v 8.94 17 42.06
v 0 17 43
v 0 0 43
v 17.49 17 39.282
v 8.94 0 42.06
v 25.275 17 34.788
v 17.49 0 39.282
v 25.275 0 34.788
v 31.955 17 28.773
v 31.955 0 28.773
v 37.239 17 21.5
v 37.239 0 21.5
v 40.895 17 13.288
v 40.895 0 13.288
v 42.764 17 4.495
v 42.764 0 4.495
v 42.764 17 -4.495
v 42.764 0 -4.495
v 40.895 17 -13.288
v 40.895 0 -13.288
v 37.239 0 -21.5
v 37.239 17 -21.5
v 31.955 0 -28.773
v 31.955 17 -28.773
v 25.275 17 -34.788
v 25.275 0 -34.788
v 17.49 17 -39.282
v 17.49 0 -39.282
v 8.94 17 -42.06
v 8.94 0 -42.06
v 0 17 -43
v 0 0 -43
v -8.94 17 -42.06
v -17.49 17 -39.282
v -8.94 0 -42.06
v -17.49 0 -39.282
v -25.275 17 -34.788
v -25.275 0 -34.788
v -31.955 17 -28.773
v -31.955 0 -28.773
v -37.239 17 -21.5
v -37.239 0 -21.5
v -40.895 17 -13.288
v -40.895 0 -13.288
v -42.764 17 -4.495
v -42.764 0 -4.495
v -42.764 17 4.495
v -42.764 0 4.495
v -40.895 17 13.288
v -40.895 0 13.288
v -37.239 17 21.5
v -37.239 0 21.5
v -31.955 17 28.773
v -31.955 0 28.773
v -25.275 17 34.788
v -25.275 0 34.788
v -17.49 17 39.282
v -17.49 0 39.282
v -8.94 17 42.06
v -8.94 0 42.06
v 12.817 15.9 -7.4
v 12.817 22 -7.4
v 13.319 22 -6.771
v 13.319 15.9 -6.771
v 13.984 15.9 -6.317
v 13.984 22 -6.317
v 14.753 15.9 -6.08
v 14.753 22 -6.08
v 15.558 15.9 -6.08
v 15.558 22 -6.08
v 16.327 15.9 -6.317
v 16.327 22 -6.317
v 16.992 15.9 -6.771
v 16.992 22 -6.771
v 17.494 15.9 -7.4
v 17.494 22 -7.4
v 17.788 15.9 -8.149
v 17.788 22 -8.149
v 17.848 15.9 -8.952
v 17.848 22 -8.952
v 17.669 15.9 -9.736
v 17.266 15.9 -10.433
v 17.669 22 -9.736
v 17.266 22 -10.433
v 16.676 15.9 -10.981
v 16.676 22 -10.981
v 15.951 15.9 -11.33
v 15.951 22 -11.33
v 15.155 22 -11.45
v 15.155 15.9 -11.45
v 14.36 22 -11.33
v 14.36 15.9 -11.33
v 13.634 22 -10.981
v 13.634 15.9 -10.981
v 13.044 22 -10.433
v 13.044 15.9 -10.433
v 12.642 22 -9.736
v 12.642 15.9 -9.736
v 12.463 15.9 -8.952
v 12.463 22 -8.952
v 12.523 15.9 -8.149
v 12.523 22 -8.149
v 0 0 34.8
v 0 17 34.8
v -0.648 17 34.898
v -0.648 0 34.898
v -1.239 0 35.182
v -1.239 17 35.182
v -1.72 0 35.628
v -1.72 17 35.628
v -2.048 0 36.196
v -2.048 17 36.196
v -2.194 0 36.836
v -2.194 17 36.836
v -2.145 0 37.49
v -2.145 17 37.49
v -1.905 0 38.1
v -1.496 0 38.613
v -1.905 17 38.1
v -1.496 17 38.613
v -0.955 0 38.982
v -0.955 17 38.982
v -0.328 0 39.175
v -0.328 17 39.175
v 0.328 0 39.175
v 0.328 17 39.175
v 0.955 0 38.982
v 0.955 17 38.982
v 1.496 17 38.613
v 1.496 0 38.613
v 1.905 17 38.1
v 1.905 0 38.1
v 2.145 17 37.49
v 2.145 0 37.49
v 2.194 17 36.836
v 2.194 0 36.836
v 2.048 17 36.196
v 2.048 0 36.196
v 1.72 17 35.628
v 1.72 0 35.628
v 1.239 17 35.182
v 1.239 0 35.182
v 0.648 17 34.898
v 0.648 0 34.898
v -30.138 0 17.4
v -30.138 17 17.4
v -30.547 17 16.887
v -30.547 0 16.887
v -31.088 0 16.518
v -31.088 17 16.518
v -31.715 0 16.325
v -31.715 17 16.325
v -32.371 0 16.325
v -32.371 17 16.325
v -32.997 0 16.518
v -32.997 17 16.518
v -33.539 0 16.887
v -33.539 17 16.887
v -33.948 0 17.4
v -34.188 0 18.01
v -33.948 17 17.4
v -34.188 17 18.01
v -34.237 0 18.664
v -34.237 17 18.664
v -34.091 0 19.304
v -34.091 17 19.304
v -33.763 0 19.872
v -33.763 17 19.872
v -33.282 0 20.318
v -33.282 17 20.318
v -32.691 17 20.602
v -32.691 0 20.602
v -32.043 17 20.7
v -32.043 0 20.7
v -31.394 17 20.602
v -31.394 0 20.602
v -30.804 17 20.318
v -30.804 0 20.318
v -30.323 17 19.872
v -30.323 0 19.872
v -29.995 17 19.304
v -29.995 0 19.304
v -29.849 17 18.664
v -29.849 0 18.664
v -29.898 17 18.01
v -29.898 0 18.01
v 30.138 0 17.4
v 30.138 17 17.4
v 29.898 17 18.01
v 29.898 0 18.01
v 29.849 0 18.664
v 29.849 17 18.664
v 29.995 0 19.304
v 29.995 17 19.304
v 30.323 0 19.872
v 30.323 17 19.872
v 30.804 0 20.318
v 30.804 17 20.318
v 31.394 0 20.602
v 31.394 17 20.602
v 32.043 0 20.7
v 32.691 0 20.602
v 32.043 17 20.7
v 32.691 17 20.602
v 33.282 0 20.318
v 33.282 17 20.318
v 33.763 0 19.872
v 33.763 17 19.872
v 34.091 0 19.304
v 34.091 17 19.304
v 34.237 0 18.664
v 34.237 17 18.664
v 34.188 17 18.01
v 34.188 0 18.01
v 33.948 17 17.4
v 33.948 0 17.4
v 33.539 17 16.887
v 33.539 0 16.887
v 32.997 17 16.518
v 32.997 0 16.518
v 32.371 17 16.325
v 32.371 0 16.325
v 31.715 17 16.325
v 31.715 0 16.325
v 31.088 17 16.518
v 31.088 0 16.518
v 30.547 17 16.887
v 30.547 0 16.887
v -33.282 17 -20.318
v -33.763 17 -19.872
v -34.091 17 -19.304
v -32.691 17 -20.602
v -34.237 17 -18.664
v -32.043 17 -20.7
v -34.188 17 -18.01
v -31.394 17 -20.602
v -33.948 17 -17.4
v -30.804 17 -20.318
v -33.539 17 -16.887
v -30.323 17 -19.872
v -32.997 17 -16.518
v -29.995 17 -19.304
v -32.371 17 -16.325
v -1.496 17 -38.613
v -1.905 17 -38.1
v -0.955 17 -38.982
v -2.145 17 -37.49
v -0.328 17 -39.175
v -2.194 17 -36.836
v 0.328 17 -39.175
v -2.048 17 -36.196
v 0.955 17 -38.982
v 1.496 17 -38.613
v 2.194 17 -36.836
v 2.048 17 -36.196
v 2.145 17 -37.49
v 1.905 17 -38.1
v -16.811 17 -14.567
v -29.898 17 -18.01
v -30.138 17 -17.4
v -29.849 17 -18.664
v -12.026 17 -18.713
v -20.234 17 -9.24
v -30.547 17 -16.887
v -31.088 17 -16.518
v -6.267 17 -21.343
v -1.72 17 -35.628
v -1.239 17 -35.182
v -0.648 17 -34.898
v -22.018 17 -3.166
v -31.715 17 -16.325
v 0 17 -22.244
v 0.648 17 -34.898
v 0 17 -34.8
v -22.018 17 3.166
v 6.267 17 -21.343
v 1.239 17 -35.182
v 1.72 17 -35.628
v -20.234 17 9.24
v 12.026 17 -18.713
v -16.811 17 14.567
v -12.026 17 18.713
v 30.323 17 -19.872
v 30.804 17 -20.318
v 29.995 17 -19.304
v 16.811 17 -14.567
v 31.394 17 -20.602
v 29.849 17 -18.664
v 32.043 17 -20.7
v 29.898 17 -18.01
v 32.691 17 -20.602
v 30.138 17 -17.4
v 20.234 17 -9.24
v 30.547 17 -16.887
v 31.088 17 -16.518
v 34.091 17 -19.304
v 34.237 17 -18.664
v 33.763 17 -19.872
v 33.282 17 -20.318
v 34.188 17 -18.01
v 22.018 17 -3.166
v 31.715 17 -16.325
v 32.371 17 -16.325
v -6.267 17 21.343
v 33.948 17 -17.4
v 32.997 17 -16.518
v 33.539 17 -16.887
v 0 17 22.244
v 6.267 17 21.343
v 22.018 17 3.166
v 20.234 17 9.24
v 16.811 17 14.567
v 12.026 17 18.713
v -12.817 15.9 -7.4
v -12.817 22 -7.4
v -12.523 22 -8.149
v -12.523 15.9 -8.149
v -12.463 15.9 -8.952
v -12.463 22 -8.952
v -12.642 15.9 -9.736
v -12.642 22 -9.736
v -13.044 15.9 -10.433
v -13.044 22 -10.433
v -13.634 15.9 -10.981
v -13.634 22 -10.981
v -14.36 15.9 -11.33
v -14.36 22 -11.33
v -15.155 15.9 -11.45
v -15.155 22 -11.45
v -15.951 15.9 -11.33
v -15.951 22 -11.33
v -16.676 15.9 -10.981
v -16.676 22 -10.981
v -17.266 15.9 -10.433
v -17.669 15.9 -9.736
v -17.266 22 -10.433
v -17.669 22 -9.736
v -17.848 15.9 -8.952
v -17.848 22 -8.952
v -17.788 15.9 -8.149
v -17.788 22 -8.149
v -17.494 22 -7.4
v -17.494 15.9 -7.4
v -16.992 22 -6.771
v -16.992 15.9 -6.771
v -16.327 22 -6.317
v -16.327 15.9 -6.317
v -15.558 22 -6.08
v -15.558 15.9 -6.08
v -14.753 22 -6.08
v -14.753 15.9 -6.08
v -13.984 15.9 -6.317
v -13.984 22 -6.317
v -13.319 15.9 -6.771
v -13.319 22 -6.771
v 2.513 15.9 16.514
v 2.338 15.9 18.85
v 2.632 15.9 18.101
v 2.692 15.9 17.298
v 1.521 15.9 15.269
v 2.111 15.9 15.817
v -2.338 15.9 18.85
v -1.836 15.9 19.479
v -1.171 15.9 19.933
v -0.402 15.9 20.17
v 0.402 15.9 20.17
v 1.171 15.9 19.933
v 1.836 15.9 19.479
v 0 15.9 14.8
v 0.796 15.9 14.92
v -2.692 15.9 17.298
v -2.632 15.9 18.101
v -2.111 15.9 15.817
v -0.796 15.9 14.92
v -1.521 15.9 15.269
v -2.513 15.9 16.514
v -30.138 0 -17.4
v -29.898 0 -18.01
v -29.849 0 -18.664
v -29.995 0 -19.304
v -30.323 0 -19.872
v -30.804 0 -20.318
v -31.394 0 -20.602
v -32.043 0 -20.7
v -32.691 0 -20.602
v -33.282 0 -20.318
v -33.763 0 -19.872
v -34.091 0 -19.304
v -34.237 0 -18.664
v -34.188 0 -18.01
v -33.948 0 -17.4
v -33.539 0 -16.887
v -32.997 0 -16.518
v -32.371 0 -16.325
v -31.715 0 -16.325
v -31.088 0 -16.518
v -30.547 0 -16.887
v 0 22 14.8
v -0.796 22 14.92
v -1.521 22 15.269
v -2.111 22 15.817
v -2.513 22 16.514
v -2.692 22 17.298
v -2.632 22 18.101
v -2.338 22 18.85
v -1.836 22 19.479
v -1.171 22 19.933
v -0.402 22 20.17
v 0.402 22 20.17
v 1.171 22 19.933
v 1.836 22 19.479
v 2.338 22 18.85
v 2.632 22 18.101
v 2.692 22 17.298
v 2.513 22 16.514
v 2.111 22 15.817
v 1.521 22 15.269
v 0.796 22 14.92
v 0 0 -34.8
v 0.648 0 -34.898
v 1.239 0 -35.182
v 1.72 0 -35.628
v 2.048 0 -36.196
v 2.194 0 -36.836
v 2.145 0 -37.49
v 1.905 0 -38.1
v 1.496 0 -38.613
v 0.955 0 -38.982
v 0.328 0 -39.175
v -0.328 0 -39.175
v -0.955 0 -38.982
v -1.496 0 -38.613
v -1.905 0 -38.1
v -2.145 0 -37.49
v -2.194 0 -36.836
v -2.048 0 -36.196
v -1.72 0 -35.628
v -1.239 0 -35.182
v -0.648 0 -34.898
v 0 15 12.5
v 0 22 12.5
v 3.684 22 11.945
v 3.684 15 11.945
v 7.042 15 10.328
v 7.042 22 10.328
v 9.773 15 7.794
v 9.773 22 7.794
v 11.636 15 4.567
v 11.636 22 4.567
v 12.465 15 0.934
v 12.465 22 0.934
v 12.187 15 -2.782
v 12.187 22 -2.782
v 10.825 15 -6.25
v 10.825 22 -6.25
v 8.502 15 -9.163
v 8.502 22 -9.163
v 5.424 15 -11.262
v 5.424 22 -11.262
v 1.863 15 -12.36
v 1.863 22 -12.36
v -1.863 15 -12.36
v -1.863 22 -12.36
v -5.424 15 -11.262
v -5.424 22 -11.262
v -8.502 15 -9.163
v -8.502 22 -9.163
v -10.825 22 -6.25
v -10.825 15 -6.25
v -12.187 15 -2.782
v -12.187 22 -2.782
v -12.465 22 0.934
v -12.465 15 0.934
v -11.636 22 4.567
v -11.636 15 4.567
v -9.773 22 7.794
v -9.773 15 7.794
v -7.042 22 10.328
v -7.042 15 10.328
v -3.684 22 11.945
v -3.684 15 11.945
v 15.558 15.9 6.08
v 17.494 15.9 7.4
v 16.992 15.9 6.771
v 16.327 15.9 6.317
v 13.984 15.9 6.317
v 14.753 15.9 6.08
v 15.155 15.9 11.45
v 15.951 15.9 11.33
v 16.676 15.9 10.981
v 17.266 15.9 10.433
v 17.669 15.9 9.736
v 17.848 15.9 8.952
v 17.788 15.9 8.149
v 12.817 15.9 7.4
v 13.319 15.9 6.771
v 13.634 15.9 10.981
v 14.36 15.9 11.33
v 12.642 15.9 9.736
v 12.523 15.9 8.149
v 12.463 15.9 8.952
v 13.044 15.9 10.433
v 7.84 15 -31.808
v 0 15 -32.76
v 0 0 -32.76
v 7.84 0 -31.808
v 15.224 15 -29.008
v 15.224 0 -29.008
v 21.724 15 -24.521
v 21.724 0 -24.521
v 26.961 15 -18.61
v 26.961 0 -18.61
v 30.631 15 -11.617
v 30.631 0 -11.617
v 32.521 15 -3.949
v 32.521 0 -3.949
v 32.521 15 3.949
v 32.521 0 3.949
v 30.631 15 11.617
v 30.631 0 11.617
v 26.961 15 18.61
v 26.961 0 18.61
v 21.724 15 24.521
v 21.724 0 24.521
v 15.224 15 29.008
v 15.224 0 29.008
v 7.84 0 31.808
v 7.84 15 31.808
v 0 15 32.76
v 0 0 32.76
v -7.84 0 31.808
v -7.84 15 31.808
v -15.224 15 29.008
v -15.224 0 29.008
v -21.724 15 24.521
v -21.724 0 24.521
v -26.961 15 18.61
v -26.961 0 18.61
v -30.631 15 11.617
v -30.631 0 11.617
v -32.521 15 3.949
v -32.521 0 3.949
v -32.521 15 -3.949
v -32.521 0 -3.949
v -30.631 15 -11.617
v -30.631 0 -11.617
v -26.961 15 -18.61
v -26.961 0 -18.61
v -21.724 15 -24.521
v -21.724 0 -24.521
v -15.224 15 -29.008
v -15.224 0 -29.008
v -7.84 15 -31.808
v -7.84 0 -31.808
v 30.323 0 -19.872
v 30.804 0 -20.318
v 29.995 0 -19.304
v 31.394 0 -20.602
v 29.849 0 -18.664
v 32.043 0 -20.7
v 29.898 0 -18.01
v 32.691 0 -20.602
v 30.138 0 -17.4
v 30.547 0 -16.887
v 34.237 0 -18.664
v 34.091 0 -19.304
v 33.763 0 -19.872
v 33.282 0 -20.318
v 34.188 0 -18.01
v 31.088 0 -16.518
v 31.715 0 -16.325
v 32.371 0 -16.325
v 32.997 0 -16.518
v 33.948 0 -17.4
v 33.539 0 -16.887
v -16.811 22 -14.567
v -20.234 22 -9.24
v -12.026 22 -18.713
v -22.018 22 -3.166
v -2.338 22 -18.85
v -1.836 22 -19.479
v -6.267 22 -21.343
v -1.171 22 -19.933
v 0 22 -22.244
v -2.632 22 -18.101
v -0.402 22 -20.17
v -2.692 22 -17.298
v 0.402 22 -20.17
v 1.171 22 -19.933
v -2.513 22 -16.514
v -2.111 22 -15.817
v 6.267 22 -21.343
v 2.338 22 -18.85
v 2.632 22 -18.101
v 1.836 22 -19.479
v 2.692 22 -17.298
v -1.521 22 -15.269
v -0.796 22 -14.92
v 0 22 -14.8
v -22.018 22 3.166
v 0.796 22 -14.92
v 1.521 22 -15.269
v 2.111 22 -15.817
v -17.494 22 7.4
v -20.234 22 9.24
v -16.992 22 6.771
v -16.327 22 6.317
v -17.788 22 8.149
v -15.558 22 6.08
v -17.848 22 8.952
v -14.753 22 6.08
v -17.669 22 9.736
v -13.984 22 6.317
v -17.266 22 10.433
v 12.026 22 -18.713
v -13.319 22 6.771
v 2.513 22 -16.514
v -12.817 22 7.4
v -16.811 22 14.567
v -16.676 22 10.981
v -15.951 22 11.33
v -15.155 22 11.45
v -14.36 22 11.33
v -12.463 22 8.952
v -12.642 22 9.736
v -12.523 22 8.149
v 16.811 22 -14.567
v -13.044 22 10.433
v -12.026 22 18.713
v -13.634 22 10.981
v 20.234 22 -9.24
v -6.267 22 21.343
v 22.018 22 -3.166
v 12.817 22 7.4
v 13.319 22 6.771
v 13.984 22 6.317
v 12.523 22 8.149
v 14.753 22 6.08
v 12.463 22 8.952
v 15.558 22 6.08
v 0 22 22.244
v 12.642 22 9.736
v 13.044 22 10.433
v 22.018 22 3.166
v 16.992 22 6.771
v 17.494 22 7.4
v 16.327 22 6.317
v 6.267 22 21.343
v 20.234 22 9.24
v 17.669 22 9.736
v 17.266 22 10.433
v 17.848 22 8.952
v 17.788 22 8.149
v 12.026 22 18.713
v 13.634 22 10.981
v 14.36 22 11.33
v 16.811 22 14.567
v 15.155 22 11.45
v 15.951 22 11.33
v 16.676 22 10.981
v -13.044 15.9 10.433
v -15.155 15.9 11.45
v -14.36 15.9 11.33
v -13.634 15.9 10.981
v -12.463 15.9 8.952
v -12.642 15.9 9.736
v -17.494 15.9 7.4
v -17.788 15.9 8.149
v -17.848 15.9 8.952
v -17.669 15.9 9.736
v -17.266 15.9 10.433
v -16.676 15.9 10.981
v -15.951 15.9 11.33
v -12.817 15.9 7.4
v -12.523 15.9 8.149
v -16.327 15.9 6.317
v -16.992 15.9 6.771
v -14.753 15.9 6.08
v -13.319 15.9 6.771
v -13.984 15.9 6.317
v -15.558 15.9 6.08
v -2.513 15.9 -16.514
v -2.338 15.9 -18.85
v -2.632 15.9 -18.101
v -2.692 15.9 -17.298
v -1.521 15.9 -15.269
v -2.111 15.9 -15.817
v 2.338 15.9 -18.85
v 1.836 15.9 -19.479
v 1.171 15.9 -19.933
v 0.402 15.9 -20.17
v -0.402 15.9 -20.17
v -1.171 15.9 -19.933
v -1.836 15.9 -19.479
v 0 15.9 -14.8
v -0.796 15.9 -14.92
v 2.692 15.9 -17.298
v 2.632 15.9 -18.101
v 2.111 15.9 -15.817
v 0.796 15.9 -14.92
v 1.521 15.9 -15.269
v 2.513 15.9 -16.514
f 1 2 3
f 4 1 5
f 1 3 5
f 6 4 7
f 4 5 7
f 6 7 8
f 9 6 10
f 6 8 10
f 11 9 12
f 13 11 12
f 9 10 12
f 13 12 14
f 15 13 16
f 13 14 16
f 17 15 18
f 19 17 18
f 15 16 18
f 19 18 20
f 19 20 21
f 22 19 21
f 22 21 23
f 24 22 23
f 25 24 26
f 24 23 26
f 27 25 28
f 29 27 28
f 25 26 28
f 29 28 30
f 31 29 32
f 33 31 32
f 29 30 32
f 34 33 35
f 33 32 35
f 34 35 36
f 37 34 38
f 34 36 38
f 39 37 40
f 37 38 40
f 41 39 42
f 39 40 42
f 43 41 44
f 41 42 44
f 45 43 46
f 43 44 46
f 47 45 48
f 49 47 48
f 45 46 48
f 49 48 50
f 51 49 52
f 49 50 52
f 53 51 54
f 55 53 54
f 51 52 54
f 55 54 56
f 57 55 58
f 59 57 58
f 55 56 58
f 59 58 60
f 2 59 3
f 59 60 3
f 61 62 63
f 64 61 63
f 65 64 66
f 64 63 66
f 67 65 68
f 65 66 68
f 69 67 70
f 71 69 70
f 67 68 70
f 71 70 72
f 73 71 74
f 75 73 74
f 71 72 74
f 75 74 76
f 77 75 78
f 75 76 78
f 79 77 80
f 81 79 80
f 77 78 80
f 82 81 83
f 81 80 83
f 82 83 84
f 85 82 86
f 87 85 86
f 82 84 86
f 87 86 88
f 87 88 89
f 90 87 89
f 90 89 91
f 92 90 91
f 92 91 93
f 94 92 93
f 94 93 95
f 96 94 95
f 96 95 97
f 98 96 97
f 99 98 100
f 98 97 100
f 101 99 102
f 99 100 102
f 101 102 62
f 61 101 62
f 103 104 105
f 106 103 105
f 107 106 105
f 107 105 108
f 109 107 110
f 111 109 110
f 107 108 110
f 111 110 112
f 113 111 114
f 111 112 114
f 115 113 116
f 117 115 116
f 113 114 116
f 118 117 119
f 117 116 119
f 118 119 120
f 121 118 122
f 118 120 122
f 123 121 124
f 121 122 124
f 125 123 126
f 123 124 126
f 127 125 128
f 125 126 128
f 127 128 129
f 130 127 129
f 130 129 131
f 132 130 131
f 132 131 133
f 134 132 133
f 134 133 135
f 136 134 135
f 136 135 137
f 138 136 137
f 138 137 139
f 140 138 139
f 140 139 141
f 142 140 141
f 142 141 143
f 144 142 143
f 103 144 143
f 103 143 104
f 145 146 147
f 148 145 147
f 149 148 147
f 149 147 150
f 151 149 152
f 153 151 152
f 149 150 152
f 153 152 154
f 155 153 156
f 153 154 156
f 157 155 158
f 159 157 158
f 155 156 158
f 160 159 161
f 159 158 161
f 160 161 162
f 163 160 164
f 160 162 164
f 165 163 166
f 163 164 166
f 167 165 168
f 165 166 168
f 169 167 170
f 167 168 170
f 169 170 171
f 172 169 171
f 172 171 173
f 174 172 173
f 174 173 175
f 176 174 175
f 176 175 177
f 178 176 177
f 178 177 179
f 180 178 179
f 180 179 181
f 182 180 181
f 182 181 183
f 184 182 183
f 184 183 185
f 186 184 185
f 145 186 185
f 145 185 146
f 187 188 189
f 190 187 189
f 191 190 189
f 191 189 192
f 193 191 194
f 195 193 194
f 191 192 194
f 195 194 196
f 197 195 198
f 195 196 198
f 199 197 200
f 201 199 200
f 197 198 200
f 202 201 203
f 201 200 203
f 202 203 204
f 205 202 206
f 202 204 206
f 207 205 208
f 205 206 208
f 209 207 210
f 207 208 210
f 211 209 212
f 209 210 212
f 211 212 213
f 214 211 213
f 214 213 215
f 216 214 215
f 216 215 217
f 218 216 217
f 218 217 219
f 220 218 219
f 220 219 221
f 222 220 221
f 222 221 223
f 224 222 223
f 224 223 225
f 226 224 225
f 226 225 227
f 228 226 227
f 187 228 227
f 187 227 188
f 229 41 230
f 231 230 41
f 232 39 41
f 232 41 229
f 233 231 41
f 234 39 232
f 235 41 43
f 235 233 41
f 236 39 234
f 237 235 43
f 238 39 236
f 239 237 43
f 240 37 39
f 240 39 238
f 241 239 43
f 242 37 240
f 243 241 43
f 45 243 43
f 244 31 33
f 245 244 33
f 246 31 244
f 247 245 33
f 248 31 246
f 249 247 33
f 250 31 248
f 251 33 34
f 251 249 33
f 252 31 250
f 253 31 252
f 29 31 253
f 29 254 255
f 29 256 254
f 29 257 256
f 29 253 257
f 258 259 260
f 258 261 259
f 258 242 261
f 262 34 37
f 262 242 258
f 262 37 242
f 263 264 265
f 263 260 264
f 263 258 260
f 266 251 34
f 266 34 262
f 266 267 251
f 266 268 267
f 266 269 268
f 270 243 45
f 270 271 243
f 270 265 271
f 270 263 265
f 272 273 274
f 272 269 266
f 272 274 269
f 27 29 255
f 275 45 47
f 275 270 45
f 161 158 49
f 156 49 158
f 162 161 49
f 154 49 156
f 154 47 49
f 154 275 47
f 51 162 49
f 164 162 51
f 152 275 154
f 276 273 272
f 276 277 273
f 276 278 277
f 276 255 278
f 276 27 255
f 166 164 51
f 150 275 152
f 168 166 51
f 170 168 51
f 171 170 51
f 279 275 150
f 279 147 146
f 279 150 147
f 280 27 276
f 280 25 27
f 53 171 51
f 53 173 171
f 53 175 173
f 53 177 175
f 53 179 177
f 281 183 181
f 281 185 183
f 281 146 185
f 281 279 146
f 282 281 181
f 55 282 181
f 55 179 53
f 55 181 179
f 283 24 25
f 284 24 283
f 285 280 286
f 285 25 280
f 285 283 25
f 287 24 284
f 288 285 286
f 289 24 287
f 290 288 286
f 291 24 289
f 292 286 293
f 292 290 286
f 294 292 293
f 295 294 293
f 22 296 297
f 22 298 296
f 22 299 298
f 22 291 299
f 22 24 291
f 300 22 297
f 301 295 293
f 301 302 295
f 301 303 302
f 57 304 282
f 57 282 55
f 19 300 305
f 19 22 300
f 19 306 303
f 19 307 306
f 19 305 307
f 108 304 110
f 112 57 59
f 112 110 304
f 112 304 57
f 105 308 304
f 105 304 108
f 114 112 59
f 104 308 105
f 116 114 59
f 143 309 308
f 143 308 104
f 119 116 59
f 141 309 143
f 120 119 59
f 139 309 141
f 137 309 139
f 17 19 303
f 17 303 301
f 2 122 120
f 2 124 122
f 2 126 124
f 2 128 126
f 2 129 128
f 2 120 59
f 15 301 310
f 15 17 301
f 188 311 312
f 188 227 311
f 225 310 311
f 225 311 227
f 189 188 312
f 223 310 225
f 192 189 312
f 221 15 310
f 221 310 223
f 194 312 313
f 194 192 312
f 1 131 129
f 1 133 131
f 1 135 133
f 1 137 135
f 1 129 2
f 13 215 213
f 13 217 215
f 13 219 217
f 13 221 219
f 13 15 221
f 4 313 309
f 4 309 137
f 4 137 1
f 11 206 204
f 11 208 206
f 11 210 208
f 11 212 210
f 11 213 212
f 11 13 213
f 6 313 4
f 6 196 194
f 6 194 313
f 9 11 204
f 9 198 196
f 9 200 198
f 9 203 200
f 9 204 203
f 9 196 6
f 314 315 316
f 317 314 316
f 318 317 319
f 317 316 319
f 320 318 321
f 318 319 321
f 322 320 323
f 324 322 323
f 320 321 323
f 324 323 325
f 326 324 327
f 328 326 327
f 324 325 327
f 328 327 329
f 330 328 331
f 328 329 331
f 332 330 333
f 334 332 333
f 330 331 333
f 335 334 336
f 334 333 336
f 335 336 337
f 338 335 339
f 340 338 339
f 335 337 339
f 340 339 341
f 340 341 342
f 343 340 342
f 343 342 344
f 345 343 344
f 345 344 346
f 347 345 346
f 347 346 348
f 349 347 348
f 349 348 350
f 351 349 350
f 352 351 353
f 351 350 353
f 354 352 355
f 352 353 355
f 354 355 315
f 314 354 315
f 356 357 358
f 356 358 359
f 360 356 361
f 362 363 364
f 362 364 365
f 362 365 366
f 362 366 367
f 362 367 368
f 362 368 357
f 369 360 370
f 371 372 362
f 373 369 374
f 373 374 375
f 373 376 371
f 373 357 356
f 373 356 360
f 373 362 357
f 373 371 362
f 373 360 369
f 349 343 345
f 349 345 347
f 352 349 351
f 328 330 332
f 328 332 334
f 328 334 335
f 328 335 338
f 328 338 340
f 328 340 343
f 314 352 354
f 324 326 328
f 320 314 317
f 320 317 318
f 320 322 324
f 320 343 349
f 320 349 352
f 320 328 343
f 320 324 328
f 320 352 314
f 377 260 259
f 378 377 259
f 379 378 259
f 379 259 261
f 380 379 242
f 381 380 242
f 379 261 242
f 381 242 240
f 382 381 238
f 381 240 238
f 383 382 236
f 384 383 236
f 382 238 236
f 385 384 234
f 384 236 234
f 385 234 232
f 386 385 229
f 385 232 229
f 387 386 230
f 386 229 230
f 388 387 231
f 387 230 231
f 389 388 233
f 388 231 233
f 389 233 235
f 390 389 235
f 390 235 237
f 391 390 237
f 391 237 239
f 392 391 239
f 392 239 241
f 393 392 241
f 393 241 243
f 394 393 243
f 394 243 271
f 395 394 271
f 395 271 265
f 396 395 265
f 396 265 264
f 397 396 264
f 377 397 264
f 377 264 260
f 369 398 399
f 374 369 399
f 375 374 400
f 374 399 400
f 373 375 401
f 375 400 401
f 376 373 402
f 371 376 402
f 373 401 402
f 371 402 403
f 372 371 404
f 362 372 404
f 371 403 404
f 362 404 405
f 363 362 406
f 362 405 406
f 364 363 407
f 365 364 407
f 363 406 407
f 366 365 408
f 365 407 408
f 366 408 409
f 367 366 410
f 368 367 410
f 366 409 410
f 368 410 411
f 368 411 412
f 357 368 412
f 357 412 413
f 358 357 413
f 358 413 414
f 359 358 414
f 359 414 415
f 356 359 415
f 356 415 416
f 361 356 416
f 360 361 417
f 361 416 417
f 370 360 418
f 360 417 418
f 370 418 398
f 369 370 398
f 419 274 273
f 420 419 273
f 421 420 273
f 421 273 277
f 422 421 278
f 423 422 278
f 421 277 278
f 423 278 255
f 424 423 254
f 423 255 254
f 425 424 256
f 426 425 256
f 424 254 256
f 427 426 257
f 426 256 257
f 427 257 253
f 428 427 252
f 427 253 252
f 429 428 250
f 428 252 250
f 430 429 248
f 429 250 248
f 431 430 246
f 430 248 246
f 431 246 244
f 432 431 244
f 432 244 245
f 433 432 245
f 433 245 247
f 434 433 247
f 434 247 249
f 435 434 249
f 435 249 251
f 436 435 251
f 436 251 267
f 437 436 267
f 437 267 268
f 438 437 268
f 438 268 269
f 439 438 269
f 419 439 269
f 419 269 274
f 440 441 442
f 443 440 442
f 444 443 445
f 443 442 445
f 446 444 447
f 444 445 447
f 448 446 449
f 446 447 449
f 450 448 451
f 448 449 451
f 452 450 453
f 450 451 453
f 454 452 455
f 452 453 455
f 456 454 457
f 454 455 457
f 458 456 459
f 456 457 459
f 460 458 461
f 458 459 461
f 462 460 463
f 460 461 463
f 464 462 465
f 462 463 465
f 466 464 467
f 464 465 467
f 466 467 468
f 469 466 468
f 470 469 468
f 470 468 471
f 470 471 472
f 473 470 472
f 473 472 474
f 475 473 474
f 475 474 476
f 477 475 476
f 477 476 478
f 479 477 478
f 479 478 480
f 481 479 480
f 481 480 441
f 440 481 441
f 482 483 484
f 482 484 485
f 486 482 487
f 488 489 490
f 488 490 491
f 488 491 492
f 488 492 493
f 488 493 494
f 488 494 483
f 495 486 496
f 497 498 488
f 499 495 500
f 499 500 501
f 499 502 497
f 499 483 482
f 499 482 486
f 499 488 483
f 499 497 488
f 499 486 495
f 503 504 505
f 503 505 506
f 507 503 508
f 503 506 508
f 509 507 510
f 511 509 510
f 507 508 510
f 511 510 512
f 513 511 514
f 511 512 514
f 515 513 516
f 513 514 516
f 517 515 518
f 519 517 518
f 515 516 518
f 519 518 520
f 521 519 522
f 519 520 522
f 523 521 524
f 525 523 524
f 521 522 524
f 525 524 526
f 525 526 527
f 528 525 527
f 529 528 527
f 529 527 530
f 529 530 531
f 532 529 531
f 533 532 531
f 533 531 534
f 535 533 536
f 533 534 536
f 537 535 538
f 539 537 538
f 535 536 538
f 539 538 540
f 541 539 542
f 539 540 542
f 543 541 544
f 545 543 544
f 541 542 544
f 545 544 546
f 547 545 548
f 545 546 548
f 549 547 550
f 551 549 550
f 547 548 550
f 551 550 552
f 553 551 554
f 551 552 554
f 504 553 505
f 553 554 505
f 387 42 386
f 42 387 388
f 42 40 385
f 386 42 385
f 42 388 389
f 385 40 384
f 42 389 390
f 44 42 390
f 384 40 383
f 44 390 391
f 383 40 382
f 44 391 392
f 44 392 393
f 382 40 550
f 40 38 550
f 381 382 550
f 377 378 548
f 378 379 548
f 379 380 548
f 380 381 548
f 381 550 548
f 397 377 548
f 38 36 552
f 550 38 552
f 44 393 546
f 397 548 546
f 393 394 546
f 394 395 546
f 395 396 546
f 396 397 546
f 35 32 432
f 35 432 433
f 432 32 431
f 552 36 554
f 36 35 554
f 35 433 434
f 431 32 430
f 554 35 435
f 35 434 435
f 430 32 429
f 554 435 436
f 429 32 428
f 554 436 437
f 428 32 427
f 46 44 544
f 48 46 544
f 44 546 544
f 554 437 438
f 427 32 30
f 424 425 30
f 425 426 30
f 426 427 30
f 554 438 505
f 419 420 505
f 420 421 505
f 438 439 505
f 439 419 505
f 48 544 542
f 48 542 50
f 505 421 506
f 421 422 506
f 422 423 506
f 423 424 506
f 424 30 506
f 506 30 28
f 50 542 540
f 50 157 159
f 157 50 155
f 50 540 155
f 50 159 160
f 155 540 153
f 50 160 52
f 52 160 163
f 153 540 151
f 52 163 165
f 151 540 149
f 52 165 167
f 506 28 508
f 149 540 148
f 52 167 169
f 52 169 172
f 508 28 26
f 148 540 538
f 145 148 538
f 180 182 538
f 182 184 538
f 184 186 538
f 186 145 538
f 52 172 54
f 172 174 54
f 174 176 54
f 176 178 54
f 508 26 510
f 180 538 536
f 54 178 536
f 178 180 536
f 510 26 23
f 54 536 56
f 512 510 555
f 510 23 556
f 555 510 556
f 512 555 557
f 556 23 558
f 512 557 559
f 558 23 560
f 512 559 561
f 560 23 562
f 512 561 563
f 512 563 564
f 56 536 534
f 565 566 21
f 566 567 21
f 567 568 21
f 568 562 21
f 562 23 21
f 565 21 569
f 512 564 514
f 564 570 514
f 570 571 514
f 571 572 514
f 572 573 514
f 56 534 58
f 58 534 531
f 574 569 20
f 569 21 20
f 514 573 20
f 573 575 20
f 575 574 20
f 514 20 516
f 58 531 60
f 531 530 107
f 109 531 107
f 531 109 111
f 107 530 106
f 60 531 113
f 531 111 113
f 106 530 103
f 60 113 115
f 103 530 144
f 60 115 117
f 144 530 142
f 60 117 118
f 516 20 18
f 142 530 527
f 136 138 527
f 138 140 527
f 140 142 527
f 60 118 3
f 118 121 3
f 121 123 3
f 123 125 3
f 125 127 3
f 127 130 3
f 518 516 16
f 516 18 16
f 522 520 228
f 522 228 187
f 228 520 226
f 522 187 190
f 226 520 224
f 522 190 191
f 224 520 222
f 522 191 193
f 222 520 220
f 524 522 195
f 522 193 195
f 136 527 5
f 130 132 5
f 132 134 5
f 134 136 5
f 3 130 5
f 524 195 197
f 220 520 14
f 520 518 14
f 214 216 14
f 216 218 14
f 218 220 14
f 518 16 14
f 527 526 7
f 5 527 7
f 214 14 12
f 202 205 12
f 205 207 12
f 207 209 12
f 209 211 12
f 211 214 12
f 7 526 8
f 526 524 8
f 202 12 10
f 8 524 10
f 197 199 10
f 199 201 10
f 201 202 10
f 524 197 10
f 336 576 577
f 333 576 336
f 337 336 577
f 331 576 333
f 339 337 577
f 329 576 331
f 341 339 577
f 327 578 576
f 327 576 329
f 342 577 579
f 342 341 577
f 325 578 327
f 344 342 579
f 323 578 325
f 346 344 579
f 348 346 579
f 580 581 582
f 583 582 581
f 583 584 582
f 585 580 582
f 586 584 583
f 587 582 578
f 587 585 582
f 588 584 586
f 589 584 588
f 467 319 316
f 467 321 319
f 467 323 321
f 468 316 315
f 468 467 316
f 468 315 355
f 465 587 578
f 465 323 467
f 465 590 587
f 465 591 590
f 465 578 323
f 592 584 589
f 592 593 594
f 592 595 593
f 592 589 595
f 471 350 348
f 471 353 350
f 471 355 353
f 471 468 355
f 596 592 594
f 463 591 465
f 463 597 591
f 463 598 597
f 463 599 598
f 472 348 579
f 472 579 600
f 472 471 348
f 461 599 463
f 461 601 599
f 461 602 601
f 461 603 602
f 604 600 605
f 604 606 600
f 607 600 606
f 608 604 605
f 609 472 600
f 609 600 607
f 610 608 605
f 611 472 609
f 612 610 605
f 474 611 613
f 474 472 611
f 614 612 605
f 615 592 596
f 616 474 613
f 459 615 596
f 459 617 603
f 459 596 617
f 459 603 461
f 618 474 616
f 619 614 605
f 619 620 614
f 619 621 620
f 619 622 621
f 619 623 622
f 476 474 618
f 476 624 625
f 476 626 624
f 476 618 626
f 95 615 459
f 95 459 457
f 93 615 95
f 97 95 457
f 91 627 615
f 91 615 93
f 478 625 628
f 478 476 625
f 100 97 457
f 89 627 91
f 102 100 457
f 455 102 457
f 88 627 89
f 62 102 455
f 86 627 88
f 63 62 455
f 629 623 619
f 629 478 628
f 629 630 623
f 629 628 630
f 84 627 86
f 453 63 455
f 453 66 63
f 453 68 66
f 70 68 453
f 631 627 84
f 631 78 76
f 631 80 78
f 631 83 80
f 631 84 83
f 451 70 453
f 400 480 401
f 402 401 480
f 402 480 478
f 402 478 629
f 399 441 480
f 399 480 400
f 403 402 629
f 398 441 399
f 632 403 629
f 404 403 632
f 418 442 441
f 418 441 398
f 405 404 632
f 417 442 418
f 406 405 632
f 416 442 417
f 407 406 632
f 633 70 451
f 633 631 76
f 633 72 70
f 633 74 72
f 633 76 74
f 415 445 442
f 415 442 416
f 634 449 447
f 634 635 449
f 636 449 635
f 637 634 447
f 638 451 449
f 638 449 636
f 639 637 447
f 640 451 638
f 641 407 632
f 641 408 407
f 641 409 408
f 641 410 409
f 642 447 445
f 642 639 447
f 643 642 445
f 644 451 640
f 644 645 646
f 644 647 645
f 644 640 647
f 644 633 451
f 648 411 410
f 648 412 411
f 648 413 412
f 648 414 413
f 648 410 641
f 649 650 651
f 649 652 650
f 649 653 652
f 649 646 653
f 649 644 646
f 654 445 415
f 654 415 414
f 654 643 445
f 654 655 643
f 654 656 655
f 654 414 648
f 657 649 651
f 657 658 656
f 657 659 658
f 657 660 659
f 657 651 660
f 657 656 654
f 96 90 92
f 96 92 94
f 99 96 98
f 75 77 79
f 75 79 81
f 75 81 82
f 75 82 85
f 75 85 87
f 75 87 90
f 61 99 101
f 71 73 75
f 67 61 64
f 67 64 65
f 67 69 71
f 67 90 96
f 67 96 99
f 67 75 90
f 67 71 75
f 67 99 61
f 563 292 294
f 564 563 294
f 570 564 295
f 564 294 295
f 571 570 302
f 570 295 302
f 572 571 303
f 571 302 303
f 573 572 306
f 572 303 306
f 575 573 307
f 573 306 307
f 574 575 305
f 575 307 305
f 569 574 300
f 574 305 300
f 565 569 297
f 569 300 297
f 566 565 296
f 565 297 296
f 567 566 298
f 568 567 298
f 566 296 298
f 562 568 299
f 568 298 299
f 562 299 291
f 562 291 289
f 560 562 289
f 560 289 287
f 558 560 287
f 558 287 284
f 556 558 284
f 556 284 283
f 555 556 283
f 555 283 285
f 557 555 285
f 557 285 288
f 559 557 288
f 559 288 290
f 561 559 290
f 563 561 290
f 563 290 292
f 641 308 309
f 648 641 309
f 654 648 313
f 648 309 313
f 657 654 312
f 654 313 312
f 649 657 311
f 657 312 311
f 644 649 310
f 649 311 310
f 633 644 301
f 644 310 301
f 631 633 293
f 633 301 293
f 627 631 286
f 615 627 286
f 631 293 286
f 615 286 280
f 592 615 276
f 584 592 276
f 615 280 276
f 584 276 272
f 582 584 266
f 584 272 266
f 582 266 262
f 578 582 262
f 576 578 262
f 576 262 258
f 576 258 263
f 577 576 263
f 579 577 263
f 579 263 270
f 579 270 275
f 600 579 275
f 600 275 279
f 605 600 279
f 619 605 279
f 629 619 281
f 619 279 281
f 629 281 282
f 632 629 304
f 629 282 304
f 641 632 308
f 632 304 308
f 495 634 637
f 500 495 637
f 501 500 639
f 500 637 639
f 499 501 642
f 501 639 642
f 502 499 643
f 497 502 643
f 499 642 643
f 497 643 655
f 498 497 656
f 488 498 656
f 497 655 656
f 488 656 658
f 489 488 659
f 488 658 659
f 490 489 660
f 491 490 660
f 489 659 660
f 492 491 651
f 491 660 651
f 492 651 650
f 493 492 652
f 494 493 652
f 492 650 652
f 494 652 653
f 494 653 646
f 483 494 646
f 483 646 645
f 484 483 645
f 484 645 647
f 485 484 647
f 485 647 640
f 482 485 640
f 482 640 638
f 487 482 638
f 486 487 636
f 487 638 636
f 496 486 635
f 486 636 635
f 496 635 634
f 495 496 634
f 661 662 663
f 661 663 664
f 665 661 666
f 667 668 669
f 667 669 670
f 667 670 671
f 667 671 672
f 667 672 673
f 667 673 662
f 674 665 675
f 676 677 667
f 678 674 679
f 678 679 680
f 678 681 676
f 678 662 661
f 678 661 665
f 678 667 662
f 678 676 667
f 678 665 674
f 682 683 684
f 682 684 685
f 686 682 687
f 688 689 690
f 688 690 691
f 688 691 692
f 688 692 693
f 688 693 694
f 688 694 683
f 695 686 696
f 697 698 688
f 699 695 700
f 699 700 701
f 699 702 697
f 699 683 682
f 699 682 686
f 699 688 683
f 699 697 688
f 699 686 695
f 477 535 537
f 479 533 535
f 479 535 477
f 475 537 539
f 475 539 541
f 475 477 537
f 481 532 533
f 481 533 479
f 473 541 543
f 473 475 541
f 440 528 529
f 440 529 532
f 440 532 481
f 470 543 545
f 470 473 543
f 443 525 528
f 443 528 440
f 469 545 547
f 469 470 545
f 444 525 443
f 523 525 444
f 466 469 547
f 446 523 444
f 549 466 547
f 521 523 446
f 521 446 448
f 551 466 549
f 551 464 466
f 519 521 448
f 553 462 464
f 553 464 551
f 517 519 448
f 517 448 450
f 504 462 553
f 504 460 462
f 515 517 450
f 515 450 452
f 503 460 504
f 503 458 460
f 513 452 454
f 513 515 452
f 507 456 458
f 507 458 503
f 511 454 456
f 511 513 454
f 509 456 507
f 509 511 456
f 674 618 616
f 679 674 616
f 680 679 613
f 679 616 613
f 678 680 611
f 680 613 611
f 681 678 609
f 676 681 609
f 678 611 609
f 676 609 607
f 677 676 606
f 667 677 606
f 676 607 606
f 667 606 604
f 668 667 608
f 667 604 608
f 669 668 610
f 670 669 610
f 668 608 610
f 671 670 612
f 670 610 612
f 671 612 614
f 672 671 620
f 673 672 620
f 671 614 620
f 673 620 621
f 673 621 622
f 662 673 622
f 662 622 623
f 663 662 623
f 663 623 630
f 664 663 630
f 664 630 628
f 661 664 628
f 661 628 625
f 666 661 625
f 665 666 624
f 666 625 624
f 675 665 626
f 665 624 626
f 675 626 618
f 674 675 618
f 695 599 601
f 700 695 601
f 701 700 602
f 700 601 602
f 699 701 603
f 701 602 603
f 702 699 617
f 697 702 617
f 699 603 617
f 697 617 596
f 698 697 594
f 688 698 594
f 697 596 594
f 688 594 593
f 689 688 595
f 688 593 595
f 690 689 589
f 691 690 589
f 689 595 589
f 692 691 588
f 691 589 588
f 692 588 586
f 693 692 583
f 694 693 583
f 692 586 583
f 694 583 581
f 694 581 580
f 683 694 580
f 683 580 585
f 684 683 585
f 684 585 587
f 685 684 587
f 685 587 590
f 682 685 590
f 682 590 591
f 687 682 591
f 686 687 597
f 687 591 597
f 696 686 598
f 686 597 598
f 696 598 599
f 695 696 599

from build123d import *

# Parameters (mm, degrees)
SKETCH_22_R              = 43
EXTRUDE_5_DEPTH          = 17
SKETCH_24_R              = 22.244
EXTRUDE_6_DEPTH          = 5
SKETCH_25_R              = 32.76
CUT_EXTRUDE_9_DEPTH      = 15
SKETCH_26_R              = 12.5
CUT_EXTRUDE_10_DEPTH     = 10
SKETCH_27_R              = 2.7
CUT_EXTRUDE_11_DEPTH     = 6.1
PATTERN_CIRCULAR_6_COUNT = 6
SKETCH_29_R              = 2.2
CUT_EXTRUDE_12_DEPTH     = 64.14269554
PATTERN_CIRCULAR_7_COUNT = 6


with BuildPart() as part:
    # 스케치22 → 보스-돌출5 (new body)
    with BuildSketch(Plane(origin=(0, 0, 0), x_dir=(1, 0, 0), z_dir=(0, 1, 0))):
        with Locations(Location((0, 0, 0), (0, 0, 270))):
            Circle(SKETCH_22_R)
    extrude(amount=EXTRUDE_5_DEPTH)

    # 스케치24 → 보스-돌출6 (add)
    with BuildSketch(Plane(origin=(0, 17, 0), x_dir=(1, 0, 0), z_dir=(0, 1, 0))):
        with Locations(Location((0, 0, 0), (0, 0, 270))):
            Circle(SKETCH_24_R)
    extrude(amount=EXTRUDE_6_DEPTH)

    # 스케치25 → 컷-돌출9 (cut)
    with BuildSketch(Plane.XZ):
        with Locations(Location((0, 0, 0), (0, 0, 270))):
            Circle(SKETCH_25_R)
    extrude(amount=-CUT_EXTRUDE_9_DEPTH, mode=Mode.SUBTRACT)

    # 스케치26 → 컷-돌출10 (cut)
    with BuildSketch(Plane(origin=(0, 22, 0), x_dir=(1, 0, 0), z_dir=(0, 1, 0))):
        with Locations(Location((0, 0, 0), (0, 0, 270))):
            Circle(SKETCH_26_R)
    extrude(amount=-CUT_EXTRUDE_10_DEPTH, mode=Mode.SUBTRACT)

    # 스케치27 → 컷-돌출11 (cut)
    with BuildSketch(Plane(origin=(0, 22, 0), x_dir=(1, 0, 0), z_dir=(0, 1, 0))):
        with Locations(Location((0, 17.5, 0), (0, 0, 270))):
            Circle(SKETCH_27_R)
    cut_extrude_11 = extrude(amount=-CUT_EXTRUDE_11_DEPTH, mode=Mode.SUBTRACT)

    # 원형 패턴6: 컷-돌출11 ×6 about axis
    pattern_circular_6_axis = Axis((0, 0, 0), (0, 1, 0))
    for i in range(1, PATTERN_CIRCULAR_6_COUNT):
        add(cut_extrude_11.rotate(pattern_circular_6_axis, i * 360 / PATTERN_CIRCULAR_6_COUNT), mode=Mode.SUBTRACT)

    # 스케치29 → 컷-돌출12 (cut, through all)
    with BuildSketch(Plane(origin=(0, 17, 0), x_dir=(1, 0, 0), z_dir=(0, 1, 0))):
        with Locations(Location((0, 37, 0), (0, 0, 270))):
            Circle(SKETCH_29_R)
    cut_extrude_12 = extrude(amount=-CUT_EXTRUDE_12_DEPTH, mode=Mode.SUBTRACT)

    # 원형 패턴7: 컷-돌출12 ×6 about axis
    pattern_circular_7_axis = Axis((0, 0, 0), (0, 1, 0))
    for i in range(1, PATTERN_CIRCULAR_7_COUNT):
        add(cut_extrude_12.rotate(pattern_circular_7_axis, i * 360 / PATTERN_CIRCULAR_7_COUNT), mode=Mode.SUBTRACT)


solid = part.part
